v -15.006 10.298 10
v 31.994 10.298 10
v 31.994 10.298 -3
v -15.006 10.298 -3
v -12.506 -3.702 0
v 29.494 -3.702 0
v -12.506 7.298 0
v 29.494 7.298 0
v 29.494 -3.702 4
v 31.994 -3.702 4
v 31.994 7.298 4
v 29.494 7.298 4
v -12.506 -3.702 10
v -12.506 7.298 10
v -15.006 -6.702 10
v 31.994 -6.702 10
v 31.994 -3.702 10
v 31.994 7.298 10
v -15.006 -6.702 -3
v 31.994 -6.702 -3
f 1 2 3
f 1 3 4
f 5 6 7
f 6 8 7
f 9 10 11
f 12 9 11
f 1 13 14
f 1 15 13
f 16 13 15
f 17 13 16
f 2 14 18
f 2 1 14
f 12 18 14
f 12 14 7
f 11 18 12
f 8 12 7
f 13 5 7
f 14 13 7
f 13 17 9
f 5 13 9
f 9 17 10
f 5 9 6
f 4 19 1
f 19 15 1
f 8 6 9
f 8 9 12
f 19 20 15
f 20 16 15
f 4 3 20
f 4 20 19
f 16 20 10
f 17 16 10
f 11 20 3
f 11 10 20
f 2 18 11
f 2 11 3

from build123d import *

# Parameters (mm, degrees)
SKETCH_1_W          = 47
SKETCH_1_H          = 17
SKETCH_1_W_2        = 42
SKETCH_1_H_2        = 11
EXTRUDE_1_DEPTH     = 10
SKETCH_2_W          = 47
SKETCH_2_H          = 17
EXTRUDE_2_DEPTH     = 3
SKETCH_3_W          = 6
SKETCH_3_H          = 11
CUT_EXTRUDE_2_DEPTH = 3


with BuildPart() as part:
    # 草圖1 → 填料-伸長1 (new body)
    with BuildSketch(Plane.XY):
        with Locations((8.49357684, 1.797560976)):
            Rectangle(SKETCH_1_W, SKETCH_1_H)
        with Locations((8.49357684, 1.797560976)):
            Rectangle(SKETCH_1_W_2, SKETCH_1_H_2, mode=Mode.SUBTRACT)
    extrude(amount=EXTRUDE_1_DEPTH)

    # 草圖2 → 填料-伸長2 (add)
    with BuildSketch(Plane(origin=(0, 0, 0), x_dir=(-1, 0, 0), z_dir=(0, 0, -1))):
        with Locations((-8.49357684, 1.797560976)):
            Rectangle(SKETCH_2_W, SKETCH_2_H)
    extrude(amount=EXTRUDE_2_DEPTH)

    # 草圖3 → 除料-伸長2 (cut)
    with BuildSketch(Plane(origin=(31.99357684, 0, 0), x_dir=(0, 0, -1), z_dir=(1, 0, 0))):
        with Locations((-7, 1.797560976)):
            Rectangle(SKETCH_3_W, SKETCH_3_H)
    extrude(amount=-CUT_EXTRUDE_2_DEPTH, mode=Mode.SUBTRACT)


solid = part.part
